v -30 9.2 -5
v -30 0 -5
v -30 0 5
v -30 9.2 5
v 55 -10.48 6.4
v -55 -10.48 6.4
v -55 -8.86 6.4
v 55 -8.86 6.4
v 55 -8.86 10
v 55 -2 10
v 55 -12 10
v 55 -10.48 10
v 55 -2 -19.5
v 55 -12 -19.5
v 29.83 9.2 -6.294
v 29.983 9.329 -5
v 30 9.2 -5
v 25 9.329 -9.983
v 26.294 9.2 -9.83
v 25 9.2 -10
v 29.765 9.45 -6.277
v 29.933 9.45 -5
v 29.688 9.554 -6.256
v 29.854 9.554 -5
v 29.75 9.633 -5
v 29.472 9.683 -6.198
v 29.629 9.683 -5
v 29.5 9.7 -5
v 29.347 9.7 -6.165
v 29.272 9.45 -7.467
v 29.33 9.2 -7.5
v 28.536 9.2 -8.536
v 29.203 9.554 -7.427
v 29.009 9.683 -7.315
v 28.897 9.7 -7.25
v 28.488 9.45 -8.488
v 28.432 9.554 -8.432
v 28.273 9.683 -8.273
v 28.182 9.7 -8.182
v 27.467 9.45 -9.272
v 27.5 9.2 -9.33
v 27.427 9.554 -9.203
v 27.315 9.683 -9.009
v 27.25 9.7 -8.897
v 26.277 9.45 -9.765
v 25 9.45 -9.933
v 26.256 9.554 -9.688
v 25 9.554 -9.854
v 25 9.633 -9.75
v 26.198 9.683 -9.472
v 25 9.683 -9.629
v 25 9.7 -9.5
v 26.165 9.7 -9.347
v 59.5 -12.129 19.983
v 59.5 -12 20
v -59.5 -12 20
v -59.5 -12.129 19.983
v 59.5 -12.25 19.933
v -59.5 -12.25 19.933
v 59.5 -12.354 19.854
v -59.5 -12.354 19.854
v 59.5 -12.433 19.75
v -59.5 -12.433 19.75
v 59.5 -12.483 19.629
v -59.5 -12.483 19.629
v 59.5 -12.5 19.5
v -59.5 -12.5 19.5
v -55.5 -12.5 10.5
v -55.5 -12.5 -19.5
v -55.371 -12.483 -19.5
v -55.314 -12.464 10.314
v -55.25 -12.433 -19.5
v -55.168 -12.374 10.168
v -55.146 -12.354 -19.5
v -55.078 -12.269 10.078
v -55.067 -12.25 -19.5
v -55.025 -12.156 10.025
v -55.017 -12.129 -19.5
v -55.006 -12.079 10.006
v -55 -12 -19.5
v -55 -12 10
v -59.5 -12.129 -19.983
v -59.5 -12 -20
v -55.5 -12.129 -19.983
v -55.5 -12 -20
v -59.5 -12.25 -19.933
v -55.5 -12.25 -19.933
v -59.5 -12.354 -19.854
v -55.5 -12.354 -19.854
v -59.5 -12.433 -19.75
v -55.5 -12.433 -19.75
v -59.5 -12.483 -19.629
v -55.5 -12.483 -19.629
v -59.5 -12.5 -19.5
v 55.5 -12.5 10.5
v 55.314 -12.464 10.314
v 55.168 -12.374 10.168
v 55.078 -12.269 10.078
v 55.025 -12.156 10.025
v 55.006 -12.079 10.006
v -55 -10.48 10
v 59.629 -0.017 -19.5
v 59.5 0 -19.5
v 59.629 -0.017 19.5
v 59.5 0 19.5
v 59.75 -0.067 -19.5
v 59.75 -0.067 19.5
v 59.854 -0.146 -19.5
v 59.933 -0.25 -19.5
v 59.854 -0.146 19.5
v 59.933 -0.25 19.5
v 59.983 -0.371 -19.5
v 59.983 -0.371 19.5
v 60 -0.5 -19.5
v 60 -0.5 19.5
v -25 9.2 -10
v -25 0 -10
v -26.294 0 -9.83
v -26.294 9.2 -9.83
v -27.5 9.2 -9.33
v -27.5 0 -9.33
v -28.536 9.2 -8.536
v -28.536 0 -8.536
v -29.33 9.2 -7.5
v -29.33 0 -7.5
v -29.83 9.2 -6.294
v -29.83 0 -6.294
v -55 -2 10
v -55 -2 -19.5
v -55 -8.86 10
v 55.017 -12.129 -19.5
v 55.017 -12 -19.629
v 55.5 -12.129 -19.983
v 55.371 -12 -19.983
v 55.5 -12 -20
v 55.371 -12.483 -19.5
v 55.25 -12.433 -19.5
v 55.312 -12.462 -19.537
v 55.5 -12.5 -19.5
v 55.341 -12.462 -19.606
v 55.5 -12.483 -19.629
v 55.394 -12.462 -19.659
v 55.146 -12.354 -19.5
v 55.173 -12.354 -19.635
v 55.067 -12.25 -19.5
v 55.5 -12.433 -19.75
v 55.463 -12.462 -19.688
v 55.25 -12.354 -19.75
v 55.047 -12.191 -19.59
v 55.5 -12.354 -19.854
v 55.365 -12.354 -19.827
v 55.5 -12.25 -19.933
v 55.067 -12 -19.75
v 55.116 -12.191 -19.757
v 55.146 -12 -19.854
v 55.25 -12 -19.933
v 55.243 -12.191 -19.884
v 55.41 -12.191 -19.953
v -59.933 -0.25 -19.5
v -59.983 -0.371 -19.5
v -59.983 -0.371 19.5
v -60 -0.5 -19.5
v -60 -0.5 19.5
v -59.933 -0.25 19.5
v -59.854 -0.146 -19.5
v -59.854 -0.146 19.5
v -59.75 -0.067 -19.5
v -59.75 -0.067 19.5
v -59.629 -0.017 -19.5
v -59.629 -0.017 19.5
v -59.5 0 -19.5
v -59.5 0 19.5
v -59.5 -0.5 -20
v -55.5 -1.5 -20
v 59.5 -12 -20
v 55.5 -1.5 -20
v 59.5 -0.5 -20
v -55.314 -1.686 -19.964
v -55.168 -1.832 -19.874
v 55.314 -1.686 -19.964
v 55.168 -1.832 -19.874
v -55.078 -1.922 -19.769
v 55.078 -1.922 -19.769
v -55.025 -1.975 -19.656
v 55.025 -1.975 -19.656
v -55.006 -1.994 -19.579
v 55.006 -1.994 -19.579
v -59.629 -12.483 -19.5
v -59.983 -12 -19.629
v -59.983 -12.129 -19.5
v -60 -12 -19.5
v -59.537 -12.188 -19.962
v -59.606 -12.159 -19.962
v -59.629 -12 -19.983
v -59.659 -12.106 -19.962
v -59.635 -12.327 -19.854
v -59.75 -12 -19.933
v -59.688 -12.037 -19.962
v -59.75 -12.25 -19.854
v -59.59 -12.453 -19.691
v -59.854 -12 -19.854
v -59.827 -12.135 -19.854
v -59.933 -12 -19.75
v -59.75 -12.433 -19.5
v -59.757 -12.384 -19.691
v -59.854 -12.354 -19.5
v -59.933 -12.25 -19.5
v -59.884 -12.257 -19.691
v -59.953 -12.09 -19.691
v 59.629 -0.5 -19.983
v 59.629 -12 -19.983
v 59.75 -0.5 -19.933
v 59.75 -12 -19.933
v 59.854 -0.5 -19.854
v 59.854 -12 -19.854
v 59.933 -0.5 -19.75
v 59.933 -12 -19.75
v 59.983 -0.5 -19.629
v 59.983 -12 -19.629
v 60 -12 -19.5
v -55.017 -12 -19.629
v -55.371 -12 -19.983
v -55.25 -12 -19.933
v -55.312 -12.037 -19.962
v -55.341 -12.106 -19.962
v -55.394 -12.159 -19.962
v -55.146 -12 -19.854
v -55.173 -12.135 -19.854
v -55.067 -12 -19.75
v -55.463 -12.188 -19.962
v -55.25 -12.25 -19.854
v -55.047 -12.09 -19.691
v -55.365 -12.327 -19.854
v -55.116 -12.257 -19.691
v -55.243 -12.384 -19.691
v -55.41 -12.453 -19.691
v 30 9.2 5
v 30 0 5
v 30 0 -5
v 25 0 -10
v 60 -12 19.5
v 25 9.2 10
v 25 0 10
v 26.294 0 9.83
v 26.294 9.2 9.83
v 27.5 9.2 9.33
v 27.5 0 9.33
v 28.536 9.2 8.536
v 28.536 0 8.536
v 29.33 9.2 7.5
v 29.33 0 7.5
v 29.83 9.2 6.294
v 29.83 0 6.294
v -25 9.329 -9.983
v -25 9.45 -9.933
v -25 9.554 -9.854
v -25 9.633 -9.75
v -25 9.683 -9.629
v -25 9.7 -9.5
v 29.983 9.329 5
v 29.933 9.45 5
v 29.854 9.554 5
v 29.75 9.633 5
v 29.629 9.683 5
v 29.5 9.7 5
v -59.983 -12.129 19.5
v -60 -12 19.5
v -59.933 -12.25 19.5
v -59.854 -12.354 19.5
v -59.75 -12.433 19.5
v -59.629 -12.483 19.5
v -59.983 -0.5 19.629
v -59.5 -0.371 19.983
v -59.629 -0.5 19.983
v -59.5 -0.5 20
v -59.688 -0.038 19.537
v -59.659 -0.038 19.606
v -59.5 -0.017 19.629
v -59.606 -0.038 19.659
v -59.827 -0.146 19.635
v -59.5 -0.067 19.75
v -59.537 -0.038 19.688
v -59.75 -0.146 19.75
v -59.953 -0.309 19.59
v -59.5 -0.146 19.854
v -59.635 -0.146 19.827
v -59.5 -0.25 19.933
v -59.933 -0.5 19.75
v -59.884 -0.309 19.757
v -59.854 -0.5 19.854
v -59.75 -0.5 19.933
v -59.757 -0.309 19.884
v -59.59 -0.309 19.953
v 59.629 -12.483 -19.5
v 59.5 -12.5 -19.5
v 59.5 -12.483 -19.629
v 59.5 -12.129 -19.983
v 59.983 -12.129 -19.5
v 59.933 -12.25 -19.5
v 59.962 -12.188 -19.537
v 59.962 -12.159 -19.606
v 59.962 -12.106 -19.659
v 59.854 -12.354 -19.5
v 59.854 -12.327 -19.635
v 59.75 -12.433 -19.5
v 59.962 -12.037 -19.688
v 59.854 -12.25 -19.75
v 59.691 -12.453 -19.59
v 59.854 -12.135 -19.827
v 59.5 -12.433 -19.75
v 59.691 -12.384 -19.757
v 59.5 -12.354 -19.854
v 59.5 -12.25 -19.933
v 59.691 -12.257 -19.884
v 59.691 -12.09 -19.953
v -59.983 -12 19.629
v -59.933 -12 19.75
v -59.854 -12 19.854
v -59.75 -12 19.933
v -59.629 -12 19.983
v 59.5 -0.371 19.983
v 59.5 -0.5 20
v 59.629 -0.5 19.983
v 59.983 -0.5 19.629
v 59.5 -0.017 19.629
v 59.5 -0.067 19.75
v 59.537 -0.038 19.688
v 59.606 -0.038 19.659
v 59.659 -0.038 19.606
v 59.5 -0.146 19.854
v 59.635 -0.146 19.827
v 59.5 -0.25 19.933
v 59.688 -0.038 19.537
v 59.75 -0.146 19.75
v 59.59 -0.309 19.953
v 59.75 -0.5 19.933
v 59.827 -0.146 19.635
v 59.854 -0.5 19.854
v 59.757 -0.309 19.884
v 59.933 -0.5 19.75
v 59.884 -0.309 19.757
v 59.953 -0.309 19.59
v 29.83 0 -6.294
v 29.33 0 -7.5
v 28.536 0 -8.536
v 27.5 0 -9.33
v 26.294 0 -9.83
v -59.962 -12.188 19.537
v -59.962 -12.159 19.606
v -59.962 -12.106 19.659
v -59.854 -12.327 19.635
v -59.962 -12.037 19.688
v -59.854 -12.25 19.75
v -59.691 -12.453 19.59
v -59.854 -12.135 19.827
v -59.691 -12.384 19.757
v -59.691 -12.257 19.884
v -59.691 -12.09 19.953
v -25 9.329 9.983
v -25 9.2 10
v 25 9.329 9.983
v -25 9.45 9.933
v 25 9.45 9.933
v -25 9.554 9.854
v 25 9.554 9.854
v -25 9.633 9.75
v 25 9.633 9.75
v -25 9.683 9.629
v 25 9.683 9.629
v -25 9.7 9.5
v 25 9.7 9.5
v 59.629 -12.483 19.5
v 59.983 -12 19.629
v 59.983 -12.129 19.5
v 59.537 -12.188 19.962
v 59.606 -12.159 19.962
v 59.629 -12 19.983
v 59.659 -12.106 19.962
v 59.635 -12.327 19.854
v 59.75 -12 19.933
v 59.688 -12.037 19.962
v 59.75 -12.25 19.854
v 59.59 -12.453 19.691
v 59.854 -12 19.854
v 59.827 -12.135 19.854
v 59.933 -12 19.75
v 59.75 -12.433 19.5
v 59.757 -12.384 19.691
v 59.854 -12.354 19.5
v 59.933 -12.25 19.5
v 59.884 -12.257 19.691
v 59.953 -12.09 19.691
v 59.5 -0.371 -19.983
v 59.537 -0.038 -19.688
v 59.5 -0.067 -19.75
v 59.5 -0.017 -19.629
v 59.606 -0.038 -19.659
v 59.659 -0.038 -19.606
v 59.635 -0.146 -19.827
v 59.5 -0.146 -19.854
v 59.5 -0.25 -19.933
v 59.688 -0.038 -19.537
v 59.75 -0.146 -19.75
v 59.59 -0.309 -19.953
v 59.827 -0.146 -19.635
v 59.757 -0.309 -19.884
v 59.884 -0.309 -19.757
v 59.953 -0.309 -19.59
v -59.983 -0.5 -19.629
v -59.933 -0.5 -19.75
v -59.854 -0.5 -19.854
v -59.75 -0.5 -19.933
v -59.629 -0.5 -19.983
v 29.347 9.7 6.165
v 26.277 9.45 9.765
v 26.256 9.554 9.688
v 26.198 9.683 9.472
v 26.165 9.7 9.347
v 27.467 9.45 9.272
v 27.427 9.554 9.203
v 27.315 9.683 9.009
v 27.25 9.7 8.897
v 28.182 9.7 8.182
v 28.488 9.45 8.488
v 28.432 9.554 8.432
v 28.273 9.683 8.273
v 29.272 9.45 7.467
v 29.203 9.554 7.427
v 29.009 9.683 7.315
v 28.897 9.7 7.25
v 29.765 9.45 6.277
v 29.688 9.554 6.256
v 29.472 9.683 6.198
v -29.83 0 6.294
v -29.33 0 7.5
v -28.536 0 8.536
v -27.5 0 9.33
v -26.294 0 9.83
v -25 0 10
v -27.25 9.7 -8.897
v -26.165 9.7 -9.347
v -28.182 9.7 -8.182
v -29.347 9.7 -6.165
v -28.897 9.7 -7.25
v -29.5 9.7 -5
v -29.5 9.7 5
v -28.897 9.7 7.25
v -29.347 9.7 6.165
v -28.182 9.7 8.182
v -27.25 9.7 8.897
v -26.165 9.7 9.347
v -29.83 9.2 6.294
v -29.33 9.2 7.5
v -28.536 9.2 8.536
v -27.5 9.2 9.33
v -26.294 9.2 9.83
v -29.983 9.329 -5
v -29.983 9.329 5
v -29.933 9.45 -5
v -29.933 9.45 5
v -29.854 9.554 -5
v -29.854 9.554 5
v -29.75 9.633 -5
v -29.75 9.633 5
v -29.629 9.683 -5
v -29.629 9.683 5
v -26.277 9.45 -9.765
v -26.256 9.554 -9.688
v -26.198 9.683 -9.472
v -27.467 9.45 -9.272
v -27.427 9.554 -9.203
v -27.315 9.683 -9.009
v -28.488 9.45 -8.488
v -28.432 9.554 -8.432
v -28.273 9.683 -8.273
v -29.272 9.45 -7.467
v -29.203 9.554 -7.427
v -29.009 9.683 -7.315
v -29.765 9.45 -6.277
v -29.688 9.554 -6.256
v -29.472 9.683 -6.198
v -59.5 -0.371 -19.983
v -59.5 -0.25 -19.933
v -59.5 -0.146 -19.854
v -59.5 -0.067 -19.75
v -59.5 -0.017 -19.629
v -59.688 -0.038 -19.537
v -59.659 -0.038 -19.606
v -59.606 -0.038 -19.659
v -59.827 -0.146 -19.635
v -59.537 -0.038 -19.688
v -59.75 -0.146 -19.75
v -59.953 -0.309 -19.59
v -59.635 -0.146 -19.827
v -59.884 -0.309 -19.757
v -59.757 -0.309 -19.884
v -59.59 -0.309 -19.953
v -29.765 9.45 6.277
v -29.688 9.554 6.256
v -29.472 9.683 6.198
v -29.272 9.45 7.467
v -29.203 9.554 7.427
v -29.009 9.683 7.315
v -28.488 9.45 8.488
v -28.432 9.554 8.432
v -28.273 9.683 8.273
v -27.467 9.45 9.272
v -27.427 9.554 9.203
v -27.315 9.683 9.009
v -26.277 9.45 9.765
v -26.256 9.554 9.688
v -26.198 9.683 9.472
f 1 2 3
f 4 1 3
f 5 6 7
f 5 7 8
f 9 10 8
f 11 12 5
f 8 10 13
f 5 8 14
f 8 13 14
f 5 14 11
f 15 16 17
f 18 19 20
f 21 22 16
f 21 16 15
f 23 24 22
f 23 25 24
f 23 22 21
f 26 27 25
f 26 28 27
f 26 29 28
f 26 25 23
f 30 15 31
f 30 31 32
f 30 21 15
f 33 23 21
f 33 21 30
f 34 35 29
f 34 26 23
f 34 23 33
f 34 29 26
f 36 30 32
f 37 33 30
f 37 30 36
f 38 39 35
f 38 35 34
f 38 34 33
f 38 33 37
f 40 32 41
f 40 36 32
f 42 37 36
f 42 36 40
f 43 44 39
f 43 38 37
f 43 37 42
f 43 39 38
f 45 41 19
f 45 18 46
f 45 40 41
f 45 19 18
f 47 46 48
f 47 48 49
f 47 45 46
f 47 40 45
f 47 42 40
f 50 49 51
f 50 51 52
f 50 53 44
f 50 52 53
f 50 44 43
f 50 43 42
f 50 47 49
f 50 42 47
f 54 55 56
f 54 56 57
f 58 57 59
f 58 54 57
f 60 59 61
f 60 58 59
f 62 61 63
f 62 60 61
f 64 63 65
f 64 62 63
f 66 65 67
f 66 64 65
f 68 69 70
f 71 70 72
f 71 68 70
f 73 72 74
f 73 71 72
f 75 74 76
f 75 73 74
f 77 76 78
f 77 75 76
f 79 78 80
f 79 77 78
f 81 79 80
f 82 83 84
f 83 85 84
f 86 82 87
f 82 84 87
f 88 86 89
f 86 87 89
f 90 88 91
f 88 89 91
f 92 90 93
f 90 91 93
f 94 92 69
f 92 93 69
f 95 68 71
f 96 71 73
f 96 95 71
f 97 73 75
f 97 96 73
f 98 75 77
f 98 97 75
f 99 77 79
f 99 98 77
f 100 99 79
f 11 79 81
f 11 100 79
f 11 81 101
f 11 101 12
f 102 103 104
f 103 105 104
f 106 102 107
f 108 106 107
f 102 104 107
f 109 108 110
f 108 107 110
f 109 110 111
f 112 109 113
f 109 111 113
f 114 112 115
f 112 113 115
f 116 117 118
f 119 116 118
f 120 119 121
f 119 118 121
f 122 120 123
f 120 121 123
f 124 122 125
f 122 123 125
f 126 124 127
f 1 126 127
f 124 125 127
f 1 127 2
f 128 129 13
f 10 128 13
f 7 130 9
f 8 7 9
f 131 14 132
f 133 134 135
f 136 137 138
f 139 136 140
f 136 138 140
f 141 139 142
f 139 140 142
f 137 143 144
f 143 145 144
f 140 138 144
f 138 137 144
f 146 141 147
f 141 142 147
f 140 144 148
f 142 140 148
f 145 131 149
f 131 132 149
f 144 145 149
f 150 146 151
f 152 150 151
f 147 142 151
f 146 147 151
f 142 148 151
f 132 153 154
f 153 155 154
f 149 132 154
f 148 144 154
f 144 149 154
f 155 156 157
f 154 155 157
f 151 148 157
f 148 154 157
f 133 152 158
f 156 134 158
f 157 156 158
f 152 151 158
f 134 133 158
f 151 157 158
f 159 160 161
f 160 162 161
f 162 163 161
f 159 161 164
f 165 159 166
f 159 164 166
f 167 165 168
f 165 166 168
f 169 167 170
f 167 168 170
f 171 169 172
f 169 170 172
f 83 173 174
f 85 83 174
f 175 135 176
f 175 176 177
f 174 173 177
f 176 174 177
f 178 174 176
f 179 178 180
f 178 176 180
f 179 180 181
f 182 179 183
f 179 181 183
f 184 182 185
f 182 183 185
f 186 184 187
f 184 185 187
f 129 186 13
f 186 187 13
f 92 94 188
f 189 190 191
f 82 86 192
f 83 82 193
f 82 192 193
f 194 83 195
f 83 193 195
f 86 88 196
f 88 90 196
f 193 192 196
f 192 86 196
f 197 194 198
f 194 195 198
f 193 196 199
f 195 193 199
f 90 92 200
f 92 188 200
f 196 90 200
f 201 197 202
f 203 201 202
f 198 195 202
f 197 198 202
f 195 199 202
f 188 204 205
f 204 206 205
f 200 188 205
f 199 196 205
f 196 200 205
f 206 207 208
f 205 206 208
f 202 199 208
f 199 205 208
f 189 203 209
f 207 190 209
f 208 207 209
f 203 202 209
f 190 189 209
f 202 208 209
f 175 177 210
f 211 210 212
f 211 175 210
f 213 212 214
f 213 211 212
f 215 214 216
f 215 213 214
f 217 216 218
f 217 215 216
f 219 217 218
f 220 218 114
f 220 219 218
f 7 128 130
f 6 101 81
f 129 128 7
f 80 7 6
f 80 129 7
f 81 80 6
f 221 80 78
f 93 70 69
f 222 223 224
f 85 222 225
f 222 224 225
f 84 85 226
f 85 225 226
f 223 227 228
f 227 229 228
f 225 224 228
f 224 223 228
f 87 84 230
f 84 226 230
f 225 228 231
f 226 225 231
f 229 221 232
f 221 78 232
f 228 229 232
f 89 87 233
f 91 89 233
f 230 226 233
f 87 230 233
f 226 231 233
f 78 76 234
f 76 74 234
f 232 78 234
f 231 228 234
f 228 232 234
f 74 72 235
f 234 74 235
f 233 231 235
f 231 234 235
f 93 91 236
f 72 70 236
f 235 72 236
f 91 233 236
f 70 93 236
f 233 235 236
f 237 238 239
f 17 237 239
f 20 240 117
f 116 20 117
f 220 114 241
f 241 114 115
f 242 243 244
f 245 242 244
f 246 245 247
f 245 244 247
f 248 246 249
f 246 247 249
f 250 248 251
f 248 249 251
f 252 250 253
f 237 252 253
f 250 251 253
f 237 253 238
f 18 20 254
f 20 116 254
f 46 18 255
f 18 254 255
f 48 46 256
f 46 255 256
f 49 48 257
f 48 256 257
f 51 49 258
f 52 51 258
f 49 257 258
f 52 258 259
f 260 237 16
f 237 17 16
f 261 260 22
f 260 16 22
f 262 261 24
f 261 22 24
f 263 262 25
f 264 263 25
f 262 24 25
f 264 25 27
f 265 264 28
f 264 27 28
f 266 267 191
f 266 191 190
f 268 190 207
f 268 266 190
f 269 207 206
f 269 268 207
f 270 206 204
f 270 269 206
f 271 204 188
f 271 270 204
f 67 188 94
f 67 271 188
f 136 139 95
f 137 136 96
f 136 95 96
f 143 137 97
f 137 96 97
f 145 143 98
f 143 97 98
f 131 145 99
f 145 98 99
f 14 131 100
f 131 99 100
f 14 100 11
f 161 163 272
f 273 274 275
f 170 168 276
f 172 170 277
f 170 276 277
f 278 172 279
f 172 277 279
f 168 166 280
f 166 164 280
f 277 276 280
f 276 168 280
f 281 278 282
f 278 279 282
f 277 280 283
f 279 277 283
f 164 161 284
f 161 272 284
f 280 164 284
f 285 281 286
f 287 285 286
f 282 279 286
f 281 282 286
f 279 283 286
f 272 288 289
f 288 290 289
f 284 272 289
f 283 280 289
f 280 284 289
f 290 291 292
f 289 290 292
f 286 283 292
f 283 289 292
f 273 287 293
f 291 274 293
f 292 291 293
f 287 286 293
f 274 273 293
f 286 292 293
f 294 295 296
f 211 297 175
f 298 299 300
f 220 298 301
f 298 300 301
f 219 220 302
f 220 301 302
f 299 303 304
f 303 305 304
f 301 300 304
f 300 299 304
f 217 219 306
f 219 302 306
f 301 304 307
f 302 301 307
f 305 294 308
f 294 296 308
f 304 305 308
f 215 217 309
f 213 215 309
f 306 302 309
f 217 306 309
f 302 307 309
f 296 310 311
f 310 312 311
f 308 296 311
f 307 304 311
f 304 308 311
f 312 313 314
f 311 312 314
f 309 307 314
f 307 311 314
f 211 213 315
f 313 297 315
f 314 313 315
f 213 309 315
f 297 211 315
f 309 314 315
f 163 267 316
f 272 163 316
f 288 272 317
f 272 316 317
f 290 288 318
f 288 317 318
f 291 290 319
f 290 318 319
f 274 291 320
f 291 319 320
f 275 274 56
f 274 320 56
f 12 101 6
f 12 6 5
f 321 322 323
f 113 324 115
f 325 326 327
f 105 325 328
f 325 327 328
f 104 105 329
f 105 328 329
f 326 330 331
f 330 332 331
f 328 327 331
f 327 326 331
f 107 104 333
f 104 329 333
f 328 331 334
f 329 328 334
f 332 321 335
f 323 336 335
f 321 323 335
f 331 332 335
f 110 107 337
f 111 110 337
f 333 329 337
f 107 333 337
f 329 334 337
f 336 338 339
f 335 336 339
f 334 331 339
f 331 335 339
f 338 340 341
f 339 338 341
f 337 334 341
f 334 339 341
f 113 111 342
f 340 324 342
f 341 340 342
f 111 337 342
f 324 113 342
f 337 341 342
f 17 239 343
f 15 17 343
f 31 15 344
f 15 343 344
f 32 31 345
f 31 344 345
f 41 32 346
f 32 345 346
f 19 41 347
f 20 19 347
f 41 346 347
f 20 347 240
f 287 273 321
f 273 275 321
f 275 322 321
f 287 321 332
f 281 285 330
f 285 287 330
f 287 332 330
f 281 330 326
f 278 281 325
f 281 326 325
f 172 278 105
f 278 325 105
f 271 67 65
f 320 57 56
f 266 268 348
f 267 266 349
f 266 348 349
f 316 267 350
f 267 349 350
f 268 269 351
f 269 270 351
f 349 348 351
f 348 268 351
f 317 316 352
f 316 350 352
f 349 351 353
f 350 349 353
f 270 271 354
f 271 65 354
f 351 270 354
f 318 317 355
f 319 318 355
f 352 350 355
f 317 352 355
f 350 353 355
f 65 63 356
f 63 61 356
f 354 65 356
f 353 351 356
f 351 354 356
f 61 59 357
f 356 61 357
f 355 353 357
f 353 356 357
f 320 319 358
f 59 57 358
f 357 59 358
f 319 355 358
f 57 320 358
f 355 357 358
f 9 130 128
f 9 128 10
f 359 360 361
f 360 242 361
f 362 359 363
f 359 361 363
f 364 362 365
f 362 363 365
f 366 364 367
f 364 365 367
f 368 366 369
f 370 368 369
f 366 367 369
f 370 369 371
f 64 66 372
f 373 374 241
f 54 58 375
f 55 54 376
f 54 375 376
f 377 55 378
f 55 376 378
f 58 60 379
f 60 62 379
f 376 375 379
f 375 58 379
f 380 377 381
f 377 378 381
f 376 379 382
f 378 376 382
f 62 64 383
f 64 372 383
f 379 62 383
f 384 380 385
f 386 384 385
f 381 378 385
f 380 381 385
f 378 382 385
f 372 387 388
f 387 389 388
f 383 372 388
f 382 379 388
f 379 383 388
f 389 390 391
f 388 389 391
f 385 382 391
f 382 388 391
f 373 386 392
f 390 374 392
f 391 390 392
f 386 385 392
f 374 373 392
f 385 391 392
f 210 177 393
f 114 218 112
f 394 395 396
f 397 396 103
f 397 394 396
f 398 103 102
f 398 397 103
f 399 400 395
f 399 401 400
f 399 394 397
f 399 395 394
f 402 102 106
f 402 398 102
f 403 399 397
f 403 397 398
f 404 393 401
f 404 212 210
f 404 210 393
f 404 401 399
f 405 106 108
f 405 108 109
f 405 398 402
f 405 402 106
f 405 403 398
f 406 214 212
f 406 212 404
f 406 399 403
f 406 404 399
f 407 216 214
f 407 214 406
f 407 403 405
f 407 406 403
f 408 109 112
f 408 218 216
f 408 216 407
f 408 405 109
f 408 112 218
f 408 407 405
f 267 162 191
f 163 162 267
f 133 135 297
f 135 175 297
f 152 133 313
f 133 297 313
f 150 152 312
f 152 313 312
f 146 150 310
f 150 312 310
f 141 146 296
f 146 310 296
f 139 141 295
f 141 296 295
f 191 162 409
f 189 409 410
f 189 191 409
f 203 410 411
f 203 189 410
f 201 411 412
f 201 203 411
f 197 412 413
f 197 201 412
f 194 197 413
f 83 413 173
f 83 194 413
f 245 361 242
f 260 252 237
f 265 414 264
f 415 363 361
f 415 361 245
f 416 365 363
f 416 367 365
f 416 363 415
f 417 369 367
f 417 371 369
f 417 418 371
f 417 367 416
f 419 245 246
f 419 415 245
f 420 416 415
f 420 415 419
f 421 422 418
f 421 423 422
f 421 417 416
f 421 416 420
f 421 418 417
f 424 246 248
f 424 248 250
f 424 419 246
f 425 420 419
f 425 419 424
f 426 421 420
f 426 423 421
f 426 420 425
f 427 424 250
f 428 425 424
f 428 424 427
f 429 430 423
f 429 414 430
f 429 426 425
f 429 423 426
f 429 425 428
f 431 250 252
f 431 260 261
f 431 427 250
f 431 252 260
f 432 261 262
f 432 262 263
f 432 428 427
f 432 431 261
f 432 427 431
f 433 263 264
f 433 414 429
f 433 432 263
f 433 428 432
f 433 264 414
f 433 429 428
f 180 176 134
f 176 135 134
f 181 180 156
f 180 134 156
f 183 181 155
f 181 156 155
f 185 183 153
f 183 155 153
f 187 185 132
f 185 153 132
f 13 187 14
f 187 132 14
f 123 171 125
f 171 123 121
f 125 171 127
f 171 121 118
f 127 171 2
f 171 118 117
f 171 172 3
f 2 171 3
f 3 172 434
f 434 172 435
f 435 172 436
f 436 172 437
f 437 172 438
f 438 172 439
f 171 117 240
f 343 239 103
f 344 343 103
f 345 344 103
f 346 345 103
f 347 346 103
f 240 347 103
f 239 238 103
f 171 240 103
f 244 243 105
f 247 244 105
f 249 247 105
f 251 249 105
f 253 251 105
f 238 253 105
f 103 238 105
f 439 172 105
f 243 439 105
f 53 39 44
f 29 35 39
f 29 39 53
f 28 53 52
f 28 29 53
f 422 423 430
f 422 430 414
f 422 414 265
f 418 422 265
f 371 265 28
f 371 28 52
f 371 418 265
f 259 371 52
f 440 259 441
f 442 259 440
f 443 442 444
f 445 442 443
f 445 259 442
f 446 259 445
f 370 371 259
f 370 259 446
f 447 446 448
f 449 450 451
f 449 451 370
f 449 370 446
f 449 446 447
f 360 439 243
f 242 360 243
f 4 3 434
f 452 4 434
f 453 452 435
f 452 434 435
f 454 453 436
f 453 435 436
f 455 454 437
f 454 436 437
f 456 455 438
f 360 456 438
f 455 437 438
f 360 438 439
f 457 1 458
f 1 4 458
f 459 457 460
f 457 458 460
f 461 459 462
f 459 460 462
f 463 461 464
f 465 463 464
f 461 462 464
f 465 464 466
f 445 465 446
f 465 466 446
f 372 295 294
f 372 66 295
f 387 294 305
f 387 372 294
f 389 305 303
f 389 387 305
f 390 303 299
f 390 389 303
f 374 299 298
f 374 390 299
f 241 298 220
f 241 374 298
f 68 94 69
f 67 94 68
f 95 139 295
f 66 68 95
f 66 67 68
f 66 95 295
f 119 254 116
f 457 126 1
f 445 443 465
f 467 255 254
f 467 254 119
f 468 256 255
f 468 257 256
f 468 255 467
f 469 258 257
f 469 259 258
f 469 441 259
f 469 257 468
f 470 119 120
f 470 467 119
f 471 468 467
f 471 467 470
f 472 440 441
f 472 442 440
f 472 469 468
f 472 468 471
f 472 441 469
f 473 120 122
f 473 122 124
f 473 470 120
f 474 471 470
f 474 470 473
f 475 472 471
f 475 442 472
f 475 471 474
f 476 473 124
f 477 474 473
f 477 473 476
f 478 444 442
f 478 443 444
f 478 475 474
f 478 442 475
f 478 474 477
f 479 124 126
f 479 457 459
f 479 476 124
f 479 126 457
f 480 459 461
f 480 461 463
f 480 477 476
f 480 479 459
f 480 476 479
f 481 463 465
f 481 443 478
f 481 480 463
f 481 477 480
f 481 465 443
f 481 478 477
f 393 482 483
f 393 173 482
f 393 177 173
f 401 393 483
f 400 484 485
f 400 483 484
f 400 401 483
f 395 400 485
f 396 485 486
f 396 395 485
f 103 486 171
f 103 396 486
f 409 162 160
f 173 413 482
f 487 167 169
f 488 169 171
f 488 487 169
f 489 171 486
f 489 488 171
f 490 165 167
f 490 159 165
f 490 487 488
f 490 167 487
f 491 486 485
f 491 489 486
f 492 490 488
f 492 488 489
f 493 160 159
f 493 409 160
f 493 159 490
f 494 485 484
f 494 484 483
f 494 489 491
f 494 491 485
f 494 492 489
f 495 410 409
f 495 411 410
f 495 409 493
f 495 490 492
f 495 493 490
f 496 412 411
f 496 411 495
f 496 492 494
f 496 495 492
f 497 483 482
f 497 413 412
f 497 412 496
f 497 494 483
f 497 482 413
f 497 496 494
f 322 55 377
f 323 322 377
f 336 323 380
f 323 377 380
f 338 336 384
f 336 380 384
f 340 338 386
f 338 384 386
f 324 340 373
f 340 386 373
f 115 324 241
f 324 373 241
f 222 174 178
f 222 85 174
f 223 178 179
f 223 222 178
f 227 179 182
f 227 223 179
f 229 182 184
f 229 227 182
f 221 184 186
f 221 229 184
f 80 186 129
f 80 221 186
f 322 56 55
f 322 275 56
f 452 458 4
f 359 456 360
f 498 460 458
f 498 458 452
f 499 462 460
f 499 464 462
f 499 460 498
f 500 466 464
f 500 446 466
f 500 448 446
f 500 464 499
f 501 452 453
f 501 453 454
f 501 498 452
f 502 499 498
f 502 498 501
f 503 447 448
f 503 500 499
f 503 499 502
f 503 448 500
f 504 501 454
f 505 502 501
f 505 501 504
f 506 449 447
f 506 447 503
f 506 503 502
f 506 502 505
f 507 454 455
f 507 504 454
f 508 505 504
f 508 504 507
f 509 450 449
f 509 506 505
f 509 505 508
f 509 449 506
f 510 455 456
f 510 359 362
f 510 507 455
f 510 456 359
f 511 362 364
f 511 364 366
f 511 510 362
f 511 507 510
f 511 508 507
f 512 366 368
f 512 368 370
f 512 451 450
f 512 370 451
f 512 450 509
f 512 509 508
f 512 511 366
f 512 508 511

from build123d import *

# Parameters (mm, degrees)
F0_W     = 120
F0_H     = 40
F1_DEPTH = 12.5
F3_DEPTH = 9.7
F4_W     = 110
F4_H     = 10.5
F5_DEPTH = 30
F6_W     = 110
F6_H     = 1.62
F7_DEPTH = 3.6
F8_R     = 0.5


with BuildPart() as f1:
    # F0 (on Front) → F1 (new body)
    with BuildSketch(Plane.XZ):
        Rectangle(F0_W, F0_H)
    extrude(amount=F1_DEPTH)

    # F2 (on face) → F3 (join)
    with BuildSketch(Plane(origin=(0, 0, 0), x_dir=(-1, 0, 0), z_dir=(0, 1, 0))):
        with BuildLine():
            Line((-25, -10), (25, -10))
            ThreePointArc((25, -10), (28.5355339059, -8.5355339059), (30, -5))
            Line((30, -5), (30, 5))
            ThreePointArc((30, 5), (28.5355339059, 8.5355339059), (25, 10))
            Line((25, 10), (-25, 10))
            ThreePointArc((-25, 10), (-28.5355339059, 8.5355339059), (-30, 5))
            Line((-30, 5), (-30, -5))
            ThreePointArc((-30, -5), (-28.5355339059, -8.5355339059), (-25, -10))
        make_face()
    extrude(amount=F3_DEPTH)

    # F4 (on face) → F5 (cut)
    with BuildSketch(Plane(origin=(0, 0, -20), x_dir=(1, 0, 0), z_dir=(0, 0, -1))):
        with Locations((0, 7.25)):
            Rectangle(F4_W, F4_H)
    extrude(amount=-F5_DEPTH, mode=Mode.SUBTRACT)

    # F6 (on face) → F7 (join)
    with BuildSketch(Plane(origin=(0, 0, 10), x_dir=(1, 0, 0), z_dir=(0, 0, -1))):
        with Locations((0, 9.67)):
            Rectangle(F6_W, F6_H)
    extrude(amount=F7_DEPTH)

    # F8
    f8_edges = [f1.edges().sort_by_distance(p)[0] for p in [
        (0, 9.7, -10),
        (0, -2, -20),
        (55, -7.25, -20),
        (55, -12.5, -5),
        (0, -12.5, 10),
        (-55, -12.5, -5),
        (-55, -7.25, -20),
        (57.5, -12.5, -20),
        (60, -12.5, 0),
        (0, -12.5, 20),
        (-60, -12.5, 0),
        (-57.5, -12.5, -20),
        (60, -6.25, -20),
        (60, -6.25, 20),
        (-60, -6.25, 20),
        (-60, -6.25, -20),
        (-60, 0, 0),
        (0, 0, 20),
        (0, 0, -20),
        (60, 0, 0),
    ]]
    fillet(f8_edges, radius=F8_R)


solid = f1.part
